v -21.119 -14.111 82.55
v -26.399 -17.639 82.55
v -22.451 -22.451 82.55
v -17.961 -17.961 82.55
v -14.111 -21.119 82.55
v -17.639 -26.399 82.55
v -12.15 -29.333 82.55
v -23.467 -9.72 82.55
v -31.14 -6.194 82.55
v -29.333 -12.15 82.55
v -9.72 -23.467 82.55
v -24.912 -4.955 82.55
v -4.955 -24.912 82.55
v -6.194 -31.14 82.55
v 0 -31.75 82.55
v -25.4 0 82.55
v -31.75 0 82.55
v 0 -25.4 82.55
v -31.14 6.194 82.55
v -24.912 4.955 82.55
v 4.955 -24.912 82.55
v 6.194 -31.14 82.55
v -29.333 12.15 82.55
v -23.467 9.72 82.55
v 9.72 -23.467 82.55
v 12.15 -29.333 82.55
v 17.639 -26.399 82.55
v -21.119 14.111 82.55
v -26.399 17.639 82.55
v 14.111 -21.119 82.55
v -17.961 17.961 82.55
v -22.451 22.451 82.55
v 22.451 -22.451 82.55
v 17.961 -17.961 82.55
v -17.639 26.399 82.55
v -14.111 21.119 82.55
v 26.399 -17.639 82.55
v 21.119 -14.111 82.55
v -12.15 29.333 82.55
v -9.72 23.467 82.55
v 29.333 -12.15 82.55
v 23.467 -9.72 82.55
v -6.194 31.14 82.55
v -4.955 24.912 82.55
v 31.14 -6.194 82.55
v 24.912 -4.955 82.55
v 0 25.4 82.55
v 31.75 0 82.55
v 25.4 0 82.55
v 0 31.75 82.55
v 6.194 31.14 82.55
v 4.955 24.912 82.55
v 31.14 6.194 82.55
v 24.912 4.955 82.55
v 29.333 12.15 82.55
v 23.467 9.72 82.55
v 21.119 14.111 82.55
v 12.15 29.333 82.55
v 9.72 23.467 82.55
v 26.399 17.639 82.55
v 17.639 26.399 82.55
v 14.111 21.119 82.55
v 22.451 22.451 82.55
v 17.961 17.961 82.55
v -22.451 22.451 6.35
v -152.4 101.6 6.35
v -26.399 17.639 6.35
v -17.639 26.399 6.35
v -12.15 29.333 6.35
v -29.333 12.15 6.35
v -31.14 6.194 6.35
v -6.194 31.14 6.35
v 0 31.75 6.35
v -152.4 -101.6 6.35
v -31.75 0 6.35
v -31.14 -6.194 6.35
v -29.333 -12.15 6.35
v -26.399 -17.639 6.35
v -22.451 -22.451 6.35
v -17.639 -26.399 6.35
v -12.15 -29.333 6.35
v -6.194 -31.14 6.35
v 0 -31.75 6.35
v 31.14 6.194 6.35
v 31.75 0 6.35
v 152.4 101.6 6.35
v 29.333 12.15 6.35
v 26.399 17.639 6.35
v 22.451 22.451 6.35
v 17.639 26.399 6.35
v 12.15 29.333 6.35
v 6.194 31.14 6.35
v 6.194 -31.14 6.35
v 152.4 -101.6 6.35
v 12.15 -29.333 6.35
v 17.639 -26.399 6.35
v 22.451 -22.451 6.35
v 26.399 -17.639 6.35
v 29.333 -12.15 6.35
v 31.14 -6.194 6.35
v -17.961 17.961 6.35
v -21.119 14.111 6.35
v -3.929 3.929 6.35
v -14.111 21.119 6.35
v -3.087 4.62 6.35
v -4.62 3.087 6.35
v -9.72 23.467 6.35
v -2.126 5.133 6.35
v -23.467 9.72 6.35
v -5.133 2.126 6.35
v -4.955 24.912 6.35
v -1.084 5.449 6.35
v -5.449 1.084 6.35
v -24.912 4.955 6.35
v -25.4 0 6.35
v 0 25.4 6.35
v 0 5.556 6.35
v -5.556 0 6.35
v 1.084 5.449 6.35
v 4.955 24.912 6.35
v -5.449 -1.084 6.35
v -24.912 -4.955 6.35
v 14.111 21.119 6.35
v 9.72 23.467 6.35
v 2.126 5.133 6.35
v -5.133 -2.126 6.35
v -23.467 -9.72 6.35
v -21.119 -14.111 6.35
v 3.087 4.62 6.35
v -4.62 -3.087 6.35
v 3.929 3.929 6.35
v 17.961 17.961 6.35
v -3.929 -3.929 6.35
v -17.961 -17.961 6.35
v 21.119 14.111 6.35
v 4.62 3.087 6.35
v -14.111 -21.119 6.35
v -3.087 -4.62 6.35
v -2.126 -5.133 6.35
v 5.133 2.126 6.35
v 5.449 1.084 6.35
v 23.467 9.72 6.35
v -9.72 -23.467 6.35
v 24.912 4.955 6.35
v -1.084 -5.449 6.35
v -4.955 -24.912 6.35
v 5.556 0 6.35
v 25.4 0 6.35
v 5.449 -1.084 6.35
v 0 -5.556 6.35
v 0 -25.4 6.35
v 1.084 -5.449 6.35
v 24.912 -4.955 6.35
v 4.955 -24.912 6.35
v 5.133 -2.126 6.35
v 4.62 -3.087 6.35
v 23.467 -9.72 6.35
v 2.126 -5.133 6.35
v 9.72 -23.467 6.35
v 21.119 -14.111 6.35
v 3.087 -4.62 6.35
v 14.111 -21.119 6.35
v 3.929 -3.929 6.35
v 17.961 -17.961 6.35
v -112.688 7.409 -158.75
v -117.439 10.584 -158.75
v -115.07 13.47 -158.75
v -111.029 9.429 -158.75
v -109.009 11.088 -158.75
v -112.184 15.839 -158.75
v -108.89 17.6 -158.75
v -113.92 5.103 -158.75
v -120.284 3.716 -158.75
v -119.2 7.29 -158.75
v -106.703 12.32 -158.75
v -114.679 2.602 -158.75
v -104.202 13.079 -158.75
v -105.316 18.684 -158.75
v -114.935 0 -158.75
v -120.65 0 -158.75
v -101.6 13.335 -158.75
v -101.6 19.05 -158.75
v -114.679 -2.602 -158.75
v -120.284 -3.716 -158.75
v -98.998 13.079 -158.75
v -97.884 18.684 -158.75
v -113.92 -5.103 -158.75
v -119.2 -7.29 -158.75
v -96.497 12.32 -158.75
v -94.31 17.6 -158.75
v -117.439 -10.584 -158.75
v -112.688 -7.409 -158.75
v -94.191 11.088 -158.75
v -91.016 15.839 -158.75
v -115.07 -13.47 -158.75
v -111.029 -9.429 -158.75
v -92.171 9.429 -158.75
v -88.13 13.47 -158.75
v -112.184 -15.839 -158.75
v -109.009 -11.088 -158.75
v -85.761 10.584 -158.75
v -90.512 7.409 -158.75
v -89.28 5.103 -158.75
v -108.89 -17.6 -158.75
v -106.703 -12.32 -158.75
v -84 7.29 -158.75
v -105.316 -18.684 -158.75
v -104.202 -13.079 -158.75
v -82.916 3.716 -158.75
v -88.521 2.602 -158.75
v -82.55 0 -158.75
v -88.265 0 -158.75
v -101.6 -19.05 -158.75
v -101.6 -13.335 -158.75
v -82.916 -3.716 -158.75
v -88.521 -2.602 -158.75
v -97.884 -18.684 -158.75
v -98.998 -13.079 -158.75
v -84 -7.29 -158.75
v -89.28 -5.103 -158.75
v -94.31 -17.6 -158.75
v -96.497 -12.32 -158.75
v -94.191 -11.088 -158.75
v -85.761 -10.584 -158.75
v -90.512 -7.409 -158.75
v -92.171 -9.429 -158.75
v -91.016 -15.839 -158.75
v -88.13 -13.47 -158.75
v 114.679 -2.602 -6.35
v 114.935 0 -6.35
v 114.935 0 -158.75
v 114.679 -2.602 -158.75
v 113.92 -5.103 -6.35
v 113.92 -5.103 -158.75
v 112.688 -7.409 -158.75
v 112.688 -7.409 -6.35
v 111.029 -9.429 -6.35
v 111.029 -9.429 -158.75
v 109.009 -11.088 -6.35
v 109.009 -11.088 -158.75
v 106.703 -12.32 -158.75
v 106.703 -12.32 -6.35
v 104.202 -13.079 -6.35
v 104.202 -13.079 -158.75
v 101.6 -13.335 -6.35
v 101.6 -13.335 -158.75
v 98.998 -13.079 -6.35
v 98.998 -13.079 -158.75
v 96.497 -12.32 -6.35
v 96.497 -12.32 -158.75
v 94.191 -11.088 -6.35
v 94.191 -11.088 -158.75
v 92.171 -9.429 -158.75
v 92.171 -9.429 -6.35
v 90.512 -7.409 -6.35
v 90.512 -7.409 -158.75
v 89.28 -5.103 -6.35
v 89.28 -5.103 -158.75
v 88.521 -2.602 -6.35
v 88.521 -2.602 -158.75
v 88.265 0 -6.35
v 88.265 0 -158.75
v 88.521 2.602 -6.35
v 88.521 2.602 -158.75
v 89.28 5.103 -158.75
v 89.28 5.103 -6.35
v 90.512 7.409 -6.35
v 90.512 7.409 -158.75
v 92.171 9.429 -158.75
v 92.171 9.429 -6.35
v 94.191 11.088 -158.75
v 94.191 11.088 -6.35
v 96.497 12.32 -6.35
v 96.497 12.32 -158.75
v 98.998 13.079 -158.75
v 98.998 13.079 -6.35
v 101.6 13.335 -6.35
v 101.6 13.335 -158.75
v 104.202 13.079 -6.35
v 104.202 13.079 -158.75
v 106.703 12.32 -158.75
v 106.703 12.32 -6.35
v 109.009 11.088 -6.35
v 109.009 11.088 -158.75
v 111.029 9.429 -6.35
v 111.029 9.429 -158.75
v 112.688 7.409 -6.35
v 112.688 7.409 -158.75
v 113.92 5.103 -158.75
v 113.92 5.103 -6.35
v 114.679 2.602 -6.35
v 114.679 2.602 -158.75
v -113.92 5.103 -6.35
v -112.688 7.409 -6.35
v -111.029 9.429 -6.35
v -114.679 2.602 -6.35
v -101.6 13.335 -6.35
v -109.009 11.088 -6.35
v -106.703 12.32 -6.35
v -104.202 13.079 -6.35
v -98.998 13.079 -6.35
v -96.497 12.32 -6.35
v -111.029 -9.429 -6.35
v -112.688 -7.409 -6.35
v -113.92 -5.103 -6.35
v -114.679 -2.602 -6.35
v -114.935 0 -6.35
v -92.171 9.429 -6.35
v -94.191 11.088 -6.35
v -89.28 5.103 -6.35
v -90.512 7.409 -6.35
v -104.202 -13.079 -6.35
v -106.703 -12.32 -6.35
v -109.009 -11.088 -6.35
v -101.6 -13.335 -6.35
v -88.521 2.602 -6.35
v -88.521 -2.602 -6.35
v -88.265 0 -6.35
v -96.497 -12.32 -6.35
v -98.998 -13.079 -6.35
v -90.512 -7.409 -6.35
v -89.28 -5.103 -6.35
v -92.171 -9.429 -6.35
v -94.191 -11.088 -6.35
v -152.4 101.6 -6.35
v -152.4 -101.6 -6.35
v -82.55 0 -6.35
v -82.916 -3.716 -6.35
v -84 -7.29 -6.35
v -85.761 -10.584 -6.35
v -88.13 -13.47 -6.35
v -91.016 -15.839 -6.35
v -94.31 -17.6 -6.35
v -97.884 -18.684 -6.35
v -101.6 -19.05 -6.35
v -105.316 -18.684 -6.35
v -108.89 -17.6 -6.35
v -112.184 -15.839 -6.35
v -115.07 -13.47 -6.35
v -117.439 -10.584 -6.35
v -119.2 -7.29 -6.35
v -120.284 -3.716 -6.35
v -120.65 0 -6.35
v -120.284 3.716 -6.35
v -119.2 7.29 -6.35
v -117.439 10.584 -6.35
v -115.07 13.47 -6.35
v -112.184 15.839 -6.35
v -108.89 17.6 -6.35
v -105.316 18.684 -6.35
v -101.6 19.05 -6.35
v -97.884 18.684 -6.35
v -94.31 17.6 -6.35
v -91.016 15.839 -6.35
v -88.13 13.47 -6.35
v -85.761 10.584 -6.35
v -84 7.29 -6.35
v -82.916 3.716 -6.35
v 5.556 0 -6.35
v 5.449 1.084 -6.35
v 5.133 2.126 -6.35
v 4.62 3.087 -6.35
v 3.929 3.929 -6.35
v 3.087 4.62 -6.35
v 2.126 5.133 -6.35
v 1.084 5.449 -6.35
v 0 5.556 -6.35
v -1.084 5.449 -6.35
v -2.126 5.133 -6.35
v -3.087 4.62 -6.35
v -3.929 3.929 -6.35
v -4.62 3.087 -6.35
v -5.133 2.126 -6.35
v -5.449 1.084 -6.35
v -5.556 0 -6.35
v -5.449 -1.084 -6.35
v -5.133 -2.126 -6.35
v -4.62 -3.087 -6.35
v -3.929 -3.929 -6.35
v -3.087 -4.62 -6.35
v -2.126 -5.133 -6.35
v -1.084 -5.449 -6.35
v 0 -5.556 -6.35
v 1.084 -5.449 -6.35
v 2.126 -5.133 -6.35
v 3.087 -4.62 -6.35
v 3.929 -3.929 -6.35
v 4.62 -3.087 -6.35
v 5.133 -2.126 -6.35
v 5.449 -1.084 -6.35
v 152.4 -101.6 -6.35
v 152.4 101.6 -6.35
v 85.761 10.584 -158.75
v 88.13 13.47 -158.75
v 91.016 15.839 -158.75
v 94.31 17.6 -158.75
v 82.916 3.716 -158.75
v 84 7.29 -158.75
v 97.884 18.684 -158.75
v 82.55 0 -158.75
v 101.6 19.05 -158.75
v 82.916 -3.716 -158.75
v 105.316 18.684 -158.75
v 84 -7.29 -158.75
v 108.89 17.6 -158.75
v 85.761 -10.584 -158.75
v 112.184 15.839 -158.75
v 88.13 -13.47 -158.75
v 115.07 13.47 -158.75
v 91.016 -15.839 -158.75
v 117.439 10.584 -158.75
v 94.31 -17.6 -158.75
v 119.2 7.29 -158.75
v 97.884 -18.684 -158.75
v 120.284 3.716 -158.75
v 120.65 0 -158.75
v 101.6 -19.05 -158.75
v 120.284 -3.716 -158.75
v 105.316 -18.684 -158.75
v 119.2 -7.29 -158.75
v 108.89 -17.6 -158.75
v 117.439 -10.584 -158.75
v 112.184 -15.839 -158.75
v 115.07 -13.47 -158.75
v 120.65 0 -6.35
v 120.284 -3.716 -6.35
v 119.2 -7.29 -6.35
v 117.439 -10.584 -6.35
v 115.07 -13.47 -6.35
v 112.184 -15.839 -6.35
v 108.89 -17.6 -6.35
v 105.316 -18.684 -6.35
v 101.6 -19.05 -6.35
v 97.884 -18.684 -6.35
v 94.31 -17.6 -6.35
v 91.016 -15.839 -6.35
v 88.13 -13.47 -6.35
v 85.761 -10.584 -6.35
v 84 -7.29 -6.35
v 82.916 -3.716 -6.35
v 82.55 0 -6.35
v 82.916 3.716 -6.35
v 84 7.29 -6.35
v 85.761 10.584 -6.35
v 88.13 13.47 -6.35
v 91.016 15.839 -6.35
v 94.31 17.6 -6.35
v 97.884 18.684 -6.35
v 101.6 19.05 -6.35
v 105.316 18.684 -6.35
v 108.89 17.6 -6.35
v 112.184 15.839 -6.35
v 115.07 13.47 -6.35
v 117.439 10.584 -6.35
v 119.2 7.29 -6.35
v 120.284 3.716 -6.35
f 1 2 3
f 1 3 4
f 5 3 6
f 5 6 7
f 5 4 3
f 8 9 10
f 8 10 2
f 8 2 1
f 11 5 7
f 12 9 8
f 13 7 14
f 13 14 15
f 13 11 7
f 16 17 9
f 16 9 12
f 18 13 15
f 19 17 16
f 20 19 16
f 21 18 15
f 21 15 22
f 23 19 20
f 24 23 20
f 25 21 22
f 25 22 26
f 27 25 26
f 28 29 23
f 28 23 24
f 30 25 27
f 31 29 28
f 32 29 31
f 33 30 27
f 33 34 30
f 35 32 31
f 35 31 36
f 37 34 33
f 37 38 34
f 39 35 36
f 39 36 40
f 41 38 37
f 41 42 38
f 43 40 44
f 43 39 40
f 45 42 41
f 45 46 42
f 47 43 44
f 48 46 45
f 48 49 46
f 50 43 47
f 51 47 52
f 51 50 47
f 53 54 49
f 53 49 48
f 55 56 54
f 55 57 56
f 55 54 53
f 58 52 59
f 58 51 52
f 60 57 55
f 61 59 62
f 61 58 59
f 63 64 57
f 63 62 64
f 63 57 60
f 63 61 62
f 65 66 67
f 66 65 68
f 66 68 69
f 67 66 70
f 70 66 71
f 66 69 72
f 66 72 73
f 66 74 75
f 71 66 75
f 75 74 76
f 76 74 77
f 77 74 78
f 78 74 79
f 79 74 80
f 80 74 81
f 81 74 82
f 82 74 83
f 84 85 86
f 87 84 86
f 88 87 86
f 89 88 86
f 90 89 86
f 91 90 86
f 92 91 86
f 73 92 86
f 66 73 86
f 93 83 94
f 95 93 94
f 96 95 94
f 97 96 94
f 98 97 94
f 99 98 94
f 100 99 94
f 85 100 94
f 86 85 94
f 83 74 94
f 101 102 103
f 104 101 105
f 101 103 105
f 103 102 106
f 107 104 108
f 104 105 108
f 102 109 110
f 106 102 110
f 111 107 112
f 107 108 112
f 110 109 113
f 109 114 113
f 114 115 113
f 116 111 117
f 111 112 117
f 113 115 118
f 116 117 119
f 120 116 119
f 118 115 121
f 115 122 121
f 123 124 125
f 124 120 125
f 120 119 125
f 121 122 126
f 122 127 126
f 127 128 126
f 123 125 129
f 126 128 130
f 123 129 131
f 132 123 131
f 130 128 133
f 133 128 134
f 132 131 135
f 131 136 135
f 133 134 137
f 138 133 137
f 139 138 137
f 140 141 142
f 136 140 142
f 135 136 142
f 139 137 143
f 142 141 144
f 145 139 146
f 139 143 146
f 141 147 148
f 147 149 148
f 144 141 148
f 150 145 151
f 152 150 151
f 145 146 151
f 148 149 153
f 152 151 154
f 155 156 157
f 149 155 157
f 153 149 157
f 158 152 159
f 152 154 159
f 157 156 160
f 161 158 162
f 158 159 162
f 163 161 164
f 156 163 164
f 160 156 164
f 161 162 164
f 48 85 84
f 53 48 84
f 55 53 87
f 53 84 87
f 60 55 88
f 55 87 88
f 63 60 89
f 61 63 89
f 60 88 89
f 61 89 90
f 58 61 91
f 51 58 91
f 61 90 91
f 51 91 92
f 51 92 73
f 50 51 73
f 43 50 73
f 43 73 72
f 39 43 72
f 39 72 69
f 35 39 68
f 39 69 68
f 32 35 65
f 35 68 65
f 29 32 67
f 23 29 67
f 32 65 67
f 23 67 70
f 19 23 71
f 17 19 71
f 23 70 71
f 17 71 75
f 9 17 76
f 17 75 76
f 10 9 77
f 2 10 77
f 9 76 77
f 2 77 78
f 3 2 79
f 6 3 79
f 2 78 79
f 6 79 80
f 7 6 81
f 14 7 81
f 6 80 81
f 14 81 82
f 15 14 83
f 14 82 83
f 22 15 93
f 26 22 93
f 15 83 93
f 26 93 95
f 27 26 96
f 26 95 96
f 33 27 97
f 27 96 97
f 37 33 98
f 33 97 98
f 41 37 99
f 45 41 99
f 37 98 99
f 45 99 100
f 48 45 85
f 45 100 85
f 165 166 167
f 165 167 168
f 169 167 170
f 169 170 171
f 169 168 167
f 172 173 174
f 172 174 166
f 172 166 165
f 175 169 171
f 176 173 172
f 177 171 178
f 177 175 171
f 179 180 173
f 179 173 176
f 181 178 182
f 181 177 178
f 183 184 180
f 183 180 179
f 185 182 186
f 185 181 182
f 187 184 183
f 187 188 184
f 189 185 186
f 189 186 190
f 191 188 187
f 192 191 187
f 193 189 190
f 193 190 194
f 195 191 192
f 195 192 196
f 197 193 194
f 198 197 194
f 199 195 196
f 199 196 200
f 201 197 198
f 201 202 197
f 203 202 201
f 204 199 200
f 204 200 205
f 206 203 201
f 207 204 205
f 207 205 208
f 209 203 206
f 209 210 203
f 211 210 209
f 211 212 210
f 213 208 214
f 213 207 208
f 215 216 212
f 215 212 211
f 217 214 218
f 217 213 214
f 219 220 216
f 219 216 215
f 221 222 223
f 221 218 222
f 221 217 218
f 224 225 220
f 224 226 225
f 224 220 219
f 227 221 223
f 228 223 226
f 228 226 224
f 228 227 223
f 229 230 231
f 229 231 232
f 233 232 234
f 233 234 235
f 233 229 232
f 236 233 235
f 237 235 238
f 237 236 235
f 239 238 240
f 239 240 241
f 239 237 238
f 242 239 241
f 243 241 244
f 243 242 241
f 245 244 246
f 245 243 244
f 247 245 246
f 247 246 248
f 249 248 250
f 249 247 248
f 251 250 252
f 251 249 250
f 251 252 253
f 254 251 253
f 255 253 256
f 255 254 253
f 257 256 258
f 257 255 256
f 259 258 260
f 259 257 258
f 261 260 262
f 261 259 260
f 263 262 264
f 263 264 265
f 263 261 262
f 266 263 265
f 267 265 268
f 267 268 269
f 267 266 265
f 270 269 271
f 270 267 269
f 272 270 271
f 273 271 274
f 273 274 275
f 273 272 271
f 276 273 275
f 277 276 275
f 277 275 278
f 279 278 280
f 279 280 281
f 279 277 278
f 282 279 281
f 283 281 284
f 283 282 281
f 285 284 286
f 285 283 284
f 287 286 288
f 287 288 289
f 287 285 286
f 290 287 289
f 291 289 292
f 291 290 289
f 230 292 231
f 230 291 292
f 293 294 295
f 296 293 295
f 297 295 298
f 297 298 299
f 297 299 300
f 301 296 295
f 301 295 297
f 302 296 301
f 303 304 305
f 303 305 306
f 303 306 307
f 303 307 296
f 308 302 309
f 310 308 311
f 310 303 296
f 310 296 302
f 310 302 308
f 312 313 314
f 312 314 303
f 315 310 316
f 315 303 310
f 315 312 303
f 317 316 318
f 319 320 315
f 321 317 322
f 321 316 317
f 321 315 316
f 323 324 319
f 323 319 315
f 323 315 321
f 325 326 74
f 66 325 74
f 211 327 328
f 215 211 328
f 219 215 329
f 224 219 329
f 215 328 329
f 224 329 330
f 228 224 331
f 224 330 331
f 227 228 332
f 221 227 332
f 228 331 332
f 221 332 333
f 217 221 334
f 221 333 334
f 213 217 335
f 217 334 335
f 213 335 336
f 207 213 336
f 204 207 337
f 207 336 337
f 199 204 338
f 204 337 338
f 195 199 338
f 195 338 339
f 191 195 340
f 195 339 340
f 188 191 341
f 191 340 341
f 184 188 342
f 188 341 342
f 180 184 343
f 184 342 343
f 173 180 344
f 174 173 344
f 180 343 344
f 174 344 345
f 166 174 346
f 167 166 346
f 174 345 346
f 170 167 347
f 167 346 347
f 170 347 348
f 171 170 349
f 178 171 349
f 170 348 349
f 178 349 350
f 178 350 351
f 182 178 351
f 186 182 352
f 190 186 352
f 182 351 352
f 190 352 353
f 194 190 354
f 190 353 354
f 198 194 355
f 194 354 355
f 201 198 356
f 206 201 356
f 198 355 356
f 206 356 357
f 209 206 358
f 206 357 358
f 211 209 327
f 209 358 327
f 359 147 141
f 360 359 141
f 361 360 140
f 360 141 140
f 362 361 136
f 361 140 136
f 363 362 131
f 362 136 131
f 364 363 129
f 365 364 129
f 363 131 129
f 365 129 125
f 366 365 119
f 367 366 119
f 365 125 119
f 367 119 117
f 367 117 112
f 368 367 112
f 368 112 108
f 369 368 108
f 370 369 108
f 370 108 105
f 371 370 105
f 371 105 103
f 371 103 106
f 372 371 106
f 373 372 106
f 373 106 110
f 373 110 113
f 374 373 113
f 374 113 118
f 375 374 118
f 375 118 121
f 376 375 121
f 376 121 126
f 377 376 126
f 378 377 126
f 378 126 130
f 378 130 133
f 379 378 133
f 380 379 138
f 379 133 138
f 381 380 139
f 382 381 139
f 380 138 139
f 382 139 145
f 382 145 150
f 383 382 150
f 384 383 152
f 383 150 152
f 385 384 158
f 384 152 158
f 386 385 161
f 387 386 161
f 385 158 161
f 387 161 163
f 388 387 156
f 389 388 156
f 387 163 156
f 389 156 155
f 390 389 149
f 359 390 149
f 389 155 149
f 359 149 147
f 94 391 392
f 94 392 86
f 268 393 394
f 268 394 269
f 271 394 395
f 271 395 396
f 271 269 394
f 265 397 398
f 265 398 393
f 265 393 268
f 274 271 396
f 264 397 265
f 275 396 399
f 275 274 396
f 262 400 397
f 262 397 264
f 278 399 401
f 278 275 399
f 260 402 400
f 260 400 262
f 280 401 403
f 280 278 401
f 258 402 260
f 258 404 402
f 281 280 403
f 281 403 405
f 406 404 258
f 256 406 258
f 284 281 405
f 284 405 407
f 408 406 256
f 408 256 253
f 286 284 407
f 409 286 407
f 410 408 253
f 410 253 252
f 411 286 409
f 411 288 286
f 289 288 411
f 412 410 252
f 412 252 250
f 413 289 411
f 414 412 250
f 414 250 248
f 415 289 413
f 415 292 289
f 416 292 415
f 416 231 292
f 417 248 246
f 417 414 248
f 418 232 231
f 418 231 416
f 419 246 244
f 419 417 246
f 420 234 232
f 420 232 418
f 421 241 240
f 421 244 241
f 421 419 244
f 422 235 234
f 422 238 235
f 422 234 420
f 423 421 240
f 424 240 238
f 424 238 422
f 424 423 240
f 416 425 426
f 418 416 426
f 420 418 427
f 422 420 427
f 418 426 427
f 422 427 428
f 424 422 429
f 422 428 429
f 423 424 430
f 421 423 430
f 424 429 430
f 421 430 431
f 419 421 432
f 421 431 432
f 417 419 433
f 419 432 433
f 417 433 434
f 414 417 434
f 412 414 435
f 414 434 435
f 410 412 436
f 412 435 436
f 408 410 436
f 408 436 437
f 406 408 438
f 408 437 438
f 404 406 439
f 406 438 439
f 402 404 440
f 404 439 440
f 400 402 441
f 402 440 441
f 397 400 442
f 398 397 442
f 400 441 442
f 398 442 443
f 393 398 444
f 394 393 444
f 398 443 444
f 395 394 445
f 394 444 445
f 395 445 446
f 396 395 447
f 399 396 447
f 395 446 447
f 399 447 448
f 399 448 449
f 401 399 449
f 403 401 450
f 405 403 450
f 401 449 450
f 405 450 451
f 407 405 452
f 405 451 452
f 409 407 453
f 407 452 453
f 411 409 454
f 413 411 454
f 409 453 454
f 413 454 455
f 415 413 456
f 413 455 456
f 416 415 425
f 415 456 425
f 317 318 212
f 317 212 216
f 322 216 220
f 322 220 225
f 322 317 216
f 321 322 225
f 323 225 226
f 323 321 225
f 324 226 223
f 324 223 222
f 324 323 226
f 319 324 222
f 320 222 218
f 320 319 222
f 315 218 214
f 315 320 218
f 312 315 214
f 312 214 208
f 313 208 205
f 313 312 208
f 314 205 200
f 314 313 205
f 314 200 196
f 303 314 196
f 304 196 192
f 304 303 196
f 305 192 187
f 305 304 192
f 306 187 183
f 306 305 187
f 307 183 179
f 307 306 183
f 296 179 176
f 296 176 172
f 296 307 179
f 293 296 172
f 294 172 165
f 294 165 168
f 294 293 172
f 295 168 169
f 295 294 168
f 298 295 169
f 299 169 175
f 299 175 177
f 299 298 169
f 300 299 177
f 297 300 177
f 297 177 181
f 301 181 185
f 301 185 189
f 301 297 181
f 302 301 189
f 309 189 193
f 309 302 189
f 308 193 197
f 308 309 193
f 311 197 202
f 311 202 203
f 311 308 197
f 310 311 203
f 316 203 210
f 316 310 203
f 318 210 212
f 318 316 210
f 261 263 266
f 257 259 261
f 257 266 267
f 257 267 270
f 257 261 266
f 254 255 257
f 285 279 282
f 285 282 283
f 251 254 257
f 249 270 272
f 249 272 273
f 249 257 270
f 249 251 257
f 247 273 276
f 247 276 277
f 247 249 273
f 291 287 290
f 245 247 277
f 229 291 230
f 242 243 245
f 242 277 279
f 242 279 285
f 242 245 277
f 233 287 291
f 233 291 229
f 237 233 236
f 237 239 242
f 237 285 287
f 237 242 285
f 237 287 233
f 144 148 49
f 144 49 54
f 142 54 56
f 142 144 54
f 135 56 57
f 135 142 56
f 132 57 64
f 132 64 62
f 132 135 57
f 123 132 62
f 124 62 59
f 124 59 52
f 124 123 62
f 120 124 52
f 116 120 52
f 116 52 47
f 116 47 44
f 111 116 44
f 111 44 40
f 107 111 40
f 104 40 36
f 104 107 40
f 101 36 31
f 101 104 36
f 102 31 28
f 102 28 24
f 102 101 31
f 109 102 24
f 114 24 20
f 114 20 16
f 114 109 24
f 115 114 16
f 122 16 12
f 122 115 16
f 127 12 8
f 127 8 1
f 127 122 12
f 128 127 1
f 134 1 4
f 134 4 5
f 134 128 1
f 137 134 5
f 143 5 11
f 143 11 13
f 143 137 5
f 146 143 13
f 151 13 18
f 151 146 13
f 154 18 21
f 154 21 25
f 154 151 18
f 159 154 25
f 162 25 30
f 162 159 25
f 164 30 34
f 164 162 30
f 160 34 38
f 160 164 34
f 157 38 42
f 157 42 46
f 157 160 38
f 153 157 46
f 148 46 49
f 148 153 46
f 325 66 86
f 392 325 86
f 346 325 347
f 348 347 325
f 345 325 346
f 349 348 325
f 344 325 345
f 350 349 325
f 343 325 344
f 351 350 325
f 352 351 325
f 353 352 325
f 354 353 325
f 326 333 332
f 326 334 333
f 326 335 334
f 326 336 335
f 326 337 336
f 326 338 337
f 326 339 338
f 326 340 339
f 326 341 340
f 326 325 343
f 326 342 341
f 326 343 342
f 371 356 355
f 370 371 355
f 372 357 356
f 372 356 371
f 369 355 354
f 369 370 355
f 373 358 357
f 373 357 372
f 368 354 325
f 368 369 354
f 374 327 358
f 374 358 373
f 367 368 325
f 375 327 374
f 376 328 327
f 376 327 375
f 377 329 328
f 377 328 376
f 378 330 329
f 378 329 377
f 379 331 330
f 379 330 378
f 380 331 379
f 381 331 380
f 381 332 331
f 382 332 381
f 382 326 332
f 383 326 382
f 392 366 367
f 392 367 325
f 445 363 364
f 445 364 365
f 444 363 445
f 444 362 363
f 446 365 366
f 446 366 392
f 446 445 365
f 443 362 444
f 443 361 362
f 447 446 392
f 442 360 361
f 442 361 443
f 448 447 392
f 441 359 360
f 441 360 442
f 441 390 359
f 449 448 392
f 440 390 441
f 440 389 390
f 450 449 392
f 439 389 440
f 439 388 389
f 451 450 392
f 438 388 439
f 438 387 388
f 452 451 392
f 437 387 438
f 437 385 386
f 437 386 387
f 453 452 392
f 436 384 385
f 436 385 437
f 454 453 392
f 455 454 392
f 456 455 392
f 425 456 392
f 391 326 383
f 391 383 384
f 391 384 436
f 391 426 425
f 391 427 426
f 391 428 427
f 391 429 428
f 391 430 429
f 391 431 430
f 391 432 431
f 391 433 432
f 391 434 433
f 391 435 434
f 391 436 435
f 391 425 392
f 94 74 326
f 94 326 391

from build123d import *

# Parameters (mm, degrees)
F0_W     = 304.8
F0_H     = 12.7
F1_DEPTH = 101.6
F2_R     = 19.05
F2_R_2   = 13.335
F3_DEPTH = 152.4
F4_R     = 5.55625
F5_DEPTH = 25.4
F6_R     = 31.75
F6_R_2   = 25.4
F7_DEPTH = 76.2


with BuildPart() as f1:
    # F0 (on Front) → F1 (new body, symmetric)
    with BuildSketch(Plane.XZ):
        Rectangle(F0_W, F0_H)
    extrude(amount=F1_DEPTH, both=True)

    # F2 (on face) → F3 (join)
    with BuildSketch(Plane(origin=(0, 0, -6.35), x_dir=(1, 0, 0), z_dir=(0, 0, -1))):
        with Locations((101.6, 0)):
            Circle(F2_R)
        with Locations((101.6, 0)):
            Circle(F2_R_2, mode=Mode.SUBTRACT)
        with Locations((-101.6, 0)):
            Circle(F2_R)
        with Locations((-101.6, 0)):
            Circle(F2_R_2, mode=Mode.SUBTRACT)
    extrude(amount=F3_DEPTH)

    # F4 (on face) → F5 (cut)
    with BuildSketch(Plane.XY.offset(6.35)):
        Circle(F4_R)
    extrude(amount=-F5_DEPTH, mode=Mode.SUBTRACT)

    # F6 (on face) → F7 (join)
    with BuildSketch(Plane.XY.offset(6.35)):
        Circle(F6_R)
        Circle(F6_R_2, mode=Mode.SUBTRACT)
    extrude(amount=F7_DEPTH)


solid = f1.part
